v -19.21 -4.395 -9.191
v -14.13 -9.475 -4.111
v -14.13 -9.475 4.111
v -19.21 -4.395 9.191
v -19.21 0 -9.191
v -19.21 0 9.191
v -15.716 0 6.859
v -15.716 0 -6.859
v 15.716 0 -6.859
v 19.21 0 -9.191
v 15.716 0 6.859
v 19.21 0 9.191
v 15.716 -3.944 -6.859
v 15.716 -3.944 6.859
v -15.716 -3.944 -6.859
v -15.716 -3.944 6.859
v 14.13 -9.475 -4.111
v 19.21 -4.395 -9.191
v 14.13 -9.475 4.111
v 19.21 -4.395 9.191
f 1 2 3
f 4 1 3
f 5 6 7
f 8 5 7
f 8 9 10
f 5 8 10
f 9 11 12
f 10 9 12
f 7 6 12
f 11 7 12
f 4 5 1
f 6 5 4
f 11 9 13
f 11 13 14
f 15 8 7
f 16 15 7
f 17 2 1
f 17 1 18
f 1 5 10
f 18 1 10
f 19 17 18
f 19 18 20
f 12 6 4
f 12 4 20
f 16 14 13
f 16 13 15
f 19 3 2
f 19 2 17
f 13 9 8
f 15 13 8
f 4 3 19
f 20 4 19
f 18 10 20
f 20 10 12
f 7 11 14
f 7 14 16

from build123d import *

# Parameters (mm, degrees)
F0_W     = 38.419276
F0_H     = 18.38255
F4_DEPTH = 9.475427
F1_SIZE  = 5.08
F2_W     = 31.43239
F2_H     = 13.718766
F3_DEPTH = 3.943906


with BuildPart() as f4:
    # F0 (on Front) → F4 (new body)
    with BuildSketch(Plane.XZ):
        Rectangle(F0_W, F0_H)
    extrude(amount=F4_DEPTH)

    # F1
    f1_edges = [f4.edges().sort_by_distance(p)[0] for p in [
        (19.209638, -9.475427, 0),
        (0, -9.475427, 9.191275),
        (-19.209638, -9.475427, 0),
        (0, -9.475427, -9.191275),
    ]]
    chamfer(f1_edges, length=F1_SIZE)

    # F2 (on face) → F3 (cut)
    with BuildSketch(Plane(origin=(0, 0, 0), x_dir=(-1, 0, 0), z_dir=(0, 1, 0))):
        Rectangle(F2_W, F2_H)
    extrude(amount=-F3_DEPTH, mode=Mode.SUBTRACT)


solid = f4.part
